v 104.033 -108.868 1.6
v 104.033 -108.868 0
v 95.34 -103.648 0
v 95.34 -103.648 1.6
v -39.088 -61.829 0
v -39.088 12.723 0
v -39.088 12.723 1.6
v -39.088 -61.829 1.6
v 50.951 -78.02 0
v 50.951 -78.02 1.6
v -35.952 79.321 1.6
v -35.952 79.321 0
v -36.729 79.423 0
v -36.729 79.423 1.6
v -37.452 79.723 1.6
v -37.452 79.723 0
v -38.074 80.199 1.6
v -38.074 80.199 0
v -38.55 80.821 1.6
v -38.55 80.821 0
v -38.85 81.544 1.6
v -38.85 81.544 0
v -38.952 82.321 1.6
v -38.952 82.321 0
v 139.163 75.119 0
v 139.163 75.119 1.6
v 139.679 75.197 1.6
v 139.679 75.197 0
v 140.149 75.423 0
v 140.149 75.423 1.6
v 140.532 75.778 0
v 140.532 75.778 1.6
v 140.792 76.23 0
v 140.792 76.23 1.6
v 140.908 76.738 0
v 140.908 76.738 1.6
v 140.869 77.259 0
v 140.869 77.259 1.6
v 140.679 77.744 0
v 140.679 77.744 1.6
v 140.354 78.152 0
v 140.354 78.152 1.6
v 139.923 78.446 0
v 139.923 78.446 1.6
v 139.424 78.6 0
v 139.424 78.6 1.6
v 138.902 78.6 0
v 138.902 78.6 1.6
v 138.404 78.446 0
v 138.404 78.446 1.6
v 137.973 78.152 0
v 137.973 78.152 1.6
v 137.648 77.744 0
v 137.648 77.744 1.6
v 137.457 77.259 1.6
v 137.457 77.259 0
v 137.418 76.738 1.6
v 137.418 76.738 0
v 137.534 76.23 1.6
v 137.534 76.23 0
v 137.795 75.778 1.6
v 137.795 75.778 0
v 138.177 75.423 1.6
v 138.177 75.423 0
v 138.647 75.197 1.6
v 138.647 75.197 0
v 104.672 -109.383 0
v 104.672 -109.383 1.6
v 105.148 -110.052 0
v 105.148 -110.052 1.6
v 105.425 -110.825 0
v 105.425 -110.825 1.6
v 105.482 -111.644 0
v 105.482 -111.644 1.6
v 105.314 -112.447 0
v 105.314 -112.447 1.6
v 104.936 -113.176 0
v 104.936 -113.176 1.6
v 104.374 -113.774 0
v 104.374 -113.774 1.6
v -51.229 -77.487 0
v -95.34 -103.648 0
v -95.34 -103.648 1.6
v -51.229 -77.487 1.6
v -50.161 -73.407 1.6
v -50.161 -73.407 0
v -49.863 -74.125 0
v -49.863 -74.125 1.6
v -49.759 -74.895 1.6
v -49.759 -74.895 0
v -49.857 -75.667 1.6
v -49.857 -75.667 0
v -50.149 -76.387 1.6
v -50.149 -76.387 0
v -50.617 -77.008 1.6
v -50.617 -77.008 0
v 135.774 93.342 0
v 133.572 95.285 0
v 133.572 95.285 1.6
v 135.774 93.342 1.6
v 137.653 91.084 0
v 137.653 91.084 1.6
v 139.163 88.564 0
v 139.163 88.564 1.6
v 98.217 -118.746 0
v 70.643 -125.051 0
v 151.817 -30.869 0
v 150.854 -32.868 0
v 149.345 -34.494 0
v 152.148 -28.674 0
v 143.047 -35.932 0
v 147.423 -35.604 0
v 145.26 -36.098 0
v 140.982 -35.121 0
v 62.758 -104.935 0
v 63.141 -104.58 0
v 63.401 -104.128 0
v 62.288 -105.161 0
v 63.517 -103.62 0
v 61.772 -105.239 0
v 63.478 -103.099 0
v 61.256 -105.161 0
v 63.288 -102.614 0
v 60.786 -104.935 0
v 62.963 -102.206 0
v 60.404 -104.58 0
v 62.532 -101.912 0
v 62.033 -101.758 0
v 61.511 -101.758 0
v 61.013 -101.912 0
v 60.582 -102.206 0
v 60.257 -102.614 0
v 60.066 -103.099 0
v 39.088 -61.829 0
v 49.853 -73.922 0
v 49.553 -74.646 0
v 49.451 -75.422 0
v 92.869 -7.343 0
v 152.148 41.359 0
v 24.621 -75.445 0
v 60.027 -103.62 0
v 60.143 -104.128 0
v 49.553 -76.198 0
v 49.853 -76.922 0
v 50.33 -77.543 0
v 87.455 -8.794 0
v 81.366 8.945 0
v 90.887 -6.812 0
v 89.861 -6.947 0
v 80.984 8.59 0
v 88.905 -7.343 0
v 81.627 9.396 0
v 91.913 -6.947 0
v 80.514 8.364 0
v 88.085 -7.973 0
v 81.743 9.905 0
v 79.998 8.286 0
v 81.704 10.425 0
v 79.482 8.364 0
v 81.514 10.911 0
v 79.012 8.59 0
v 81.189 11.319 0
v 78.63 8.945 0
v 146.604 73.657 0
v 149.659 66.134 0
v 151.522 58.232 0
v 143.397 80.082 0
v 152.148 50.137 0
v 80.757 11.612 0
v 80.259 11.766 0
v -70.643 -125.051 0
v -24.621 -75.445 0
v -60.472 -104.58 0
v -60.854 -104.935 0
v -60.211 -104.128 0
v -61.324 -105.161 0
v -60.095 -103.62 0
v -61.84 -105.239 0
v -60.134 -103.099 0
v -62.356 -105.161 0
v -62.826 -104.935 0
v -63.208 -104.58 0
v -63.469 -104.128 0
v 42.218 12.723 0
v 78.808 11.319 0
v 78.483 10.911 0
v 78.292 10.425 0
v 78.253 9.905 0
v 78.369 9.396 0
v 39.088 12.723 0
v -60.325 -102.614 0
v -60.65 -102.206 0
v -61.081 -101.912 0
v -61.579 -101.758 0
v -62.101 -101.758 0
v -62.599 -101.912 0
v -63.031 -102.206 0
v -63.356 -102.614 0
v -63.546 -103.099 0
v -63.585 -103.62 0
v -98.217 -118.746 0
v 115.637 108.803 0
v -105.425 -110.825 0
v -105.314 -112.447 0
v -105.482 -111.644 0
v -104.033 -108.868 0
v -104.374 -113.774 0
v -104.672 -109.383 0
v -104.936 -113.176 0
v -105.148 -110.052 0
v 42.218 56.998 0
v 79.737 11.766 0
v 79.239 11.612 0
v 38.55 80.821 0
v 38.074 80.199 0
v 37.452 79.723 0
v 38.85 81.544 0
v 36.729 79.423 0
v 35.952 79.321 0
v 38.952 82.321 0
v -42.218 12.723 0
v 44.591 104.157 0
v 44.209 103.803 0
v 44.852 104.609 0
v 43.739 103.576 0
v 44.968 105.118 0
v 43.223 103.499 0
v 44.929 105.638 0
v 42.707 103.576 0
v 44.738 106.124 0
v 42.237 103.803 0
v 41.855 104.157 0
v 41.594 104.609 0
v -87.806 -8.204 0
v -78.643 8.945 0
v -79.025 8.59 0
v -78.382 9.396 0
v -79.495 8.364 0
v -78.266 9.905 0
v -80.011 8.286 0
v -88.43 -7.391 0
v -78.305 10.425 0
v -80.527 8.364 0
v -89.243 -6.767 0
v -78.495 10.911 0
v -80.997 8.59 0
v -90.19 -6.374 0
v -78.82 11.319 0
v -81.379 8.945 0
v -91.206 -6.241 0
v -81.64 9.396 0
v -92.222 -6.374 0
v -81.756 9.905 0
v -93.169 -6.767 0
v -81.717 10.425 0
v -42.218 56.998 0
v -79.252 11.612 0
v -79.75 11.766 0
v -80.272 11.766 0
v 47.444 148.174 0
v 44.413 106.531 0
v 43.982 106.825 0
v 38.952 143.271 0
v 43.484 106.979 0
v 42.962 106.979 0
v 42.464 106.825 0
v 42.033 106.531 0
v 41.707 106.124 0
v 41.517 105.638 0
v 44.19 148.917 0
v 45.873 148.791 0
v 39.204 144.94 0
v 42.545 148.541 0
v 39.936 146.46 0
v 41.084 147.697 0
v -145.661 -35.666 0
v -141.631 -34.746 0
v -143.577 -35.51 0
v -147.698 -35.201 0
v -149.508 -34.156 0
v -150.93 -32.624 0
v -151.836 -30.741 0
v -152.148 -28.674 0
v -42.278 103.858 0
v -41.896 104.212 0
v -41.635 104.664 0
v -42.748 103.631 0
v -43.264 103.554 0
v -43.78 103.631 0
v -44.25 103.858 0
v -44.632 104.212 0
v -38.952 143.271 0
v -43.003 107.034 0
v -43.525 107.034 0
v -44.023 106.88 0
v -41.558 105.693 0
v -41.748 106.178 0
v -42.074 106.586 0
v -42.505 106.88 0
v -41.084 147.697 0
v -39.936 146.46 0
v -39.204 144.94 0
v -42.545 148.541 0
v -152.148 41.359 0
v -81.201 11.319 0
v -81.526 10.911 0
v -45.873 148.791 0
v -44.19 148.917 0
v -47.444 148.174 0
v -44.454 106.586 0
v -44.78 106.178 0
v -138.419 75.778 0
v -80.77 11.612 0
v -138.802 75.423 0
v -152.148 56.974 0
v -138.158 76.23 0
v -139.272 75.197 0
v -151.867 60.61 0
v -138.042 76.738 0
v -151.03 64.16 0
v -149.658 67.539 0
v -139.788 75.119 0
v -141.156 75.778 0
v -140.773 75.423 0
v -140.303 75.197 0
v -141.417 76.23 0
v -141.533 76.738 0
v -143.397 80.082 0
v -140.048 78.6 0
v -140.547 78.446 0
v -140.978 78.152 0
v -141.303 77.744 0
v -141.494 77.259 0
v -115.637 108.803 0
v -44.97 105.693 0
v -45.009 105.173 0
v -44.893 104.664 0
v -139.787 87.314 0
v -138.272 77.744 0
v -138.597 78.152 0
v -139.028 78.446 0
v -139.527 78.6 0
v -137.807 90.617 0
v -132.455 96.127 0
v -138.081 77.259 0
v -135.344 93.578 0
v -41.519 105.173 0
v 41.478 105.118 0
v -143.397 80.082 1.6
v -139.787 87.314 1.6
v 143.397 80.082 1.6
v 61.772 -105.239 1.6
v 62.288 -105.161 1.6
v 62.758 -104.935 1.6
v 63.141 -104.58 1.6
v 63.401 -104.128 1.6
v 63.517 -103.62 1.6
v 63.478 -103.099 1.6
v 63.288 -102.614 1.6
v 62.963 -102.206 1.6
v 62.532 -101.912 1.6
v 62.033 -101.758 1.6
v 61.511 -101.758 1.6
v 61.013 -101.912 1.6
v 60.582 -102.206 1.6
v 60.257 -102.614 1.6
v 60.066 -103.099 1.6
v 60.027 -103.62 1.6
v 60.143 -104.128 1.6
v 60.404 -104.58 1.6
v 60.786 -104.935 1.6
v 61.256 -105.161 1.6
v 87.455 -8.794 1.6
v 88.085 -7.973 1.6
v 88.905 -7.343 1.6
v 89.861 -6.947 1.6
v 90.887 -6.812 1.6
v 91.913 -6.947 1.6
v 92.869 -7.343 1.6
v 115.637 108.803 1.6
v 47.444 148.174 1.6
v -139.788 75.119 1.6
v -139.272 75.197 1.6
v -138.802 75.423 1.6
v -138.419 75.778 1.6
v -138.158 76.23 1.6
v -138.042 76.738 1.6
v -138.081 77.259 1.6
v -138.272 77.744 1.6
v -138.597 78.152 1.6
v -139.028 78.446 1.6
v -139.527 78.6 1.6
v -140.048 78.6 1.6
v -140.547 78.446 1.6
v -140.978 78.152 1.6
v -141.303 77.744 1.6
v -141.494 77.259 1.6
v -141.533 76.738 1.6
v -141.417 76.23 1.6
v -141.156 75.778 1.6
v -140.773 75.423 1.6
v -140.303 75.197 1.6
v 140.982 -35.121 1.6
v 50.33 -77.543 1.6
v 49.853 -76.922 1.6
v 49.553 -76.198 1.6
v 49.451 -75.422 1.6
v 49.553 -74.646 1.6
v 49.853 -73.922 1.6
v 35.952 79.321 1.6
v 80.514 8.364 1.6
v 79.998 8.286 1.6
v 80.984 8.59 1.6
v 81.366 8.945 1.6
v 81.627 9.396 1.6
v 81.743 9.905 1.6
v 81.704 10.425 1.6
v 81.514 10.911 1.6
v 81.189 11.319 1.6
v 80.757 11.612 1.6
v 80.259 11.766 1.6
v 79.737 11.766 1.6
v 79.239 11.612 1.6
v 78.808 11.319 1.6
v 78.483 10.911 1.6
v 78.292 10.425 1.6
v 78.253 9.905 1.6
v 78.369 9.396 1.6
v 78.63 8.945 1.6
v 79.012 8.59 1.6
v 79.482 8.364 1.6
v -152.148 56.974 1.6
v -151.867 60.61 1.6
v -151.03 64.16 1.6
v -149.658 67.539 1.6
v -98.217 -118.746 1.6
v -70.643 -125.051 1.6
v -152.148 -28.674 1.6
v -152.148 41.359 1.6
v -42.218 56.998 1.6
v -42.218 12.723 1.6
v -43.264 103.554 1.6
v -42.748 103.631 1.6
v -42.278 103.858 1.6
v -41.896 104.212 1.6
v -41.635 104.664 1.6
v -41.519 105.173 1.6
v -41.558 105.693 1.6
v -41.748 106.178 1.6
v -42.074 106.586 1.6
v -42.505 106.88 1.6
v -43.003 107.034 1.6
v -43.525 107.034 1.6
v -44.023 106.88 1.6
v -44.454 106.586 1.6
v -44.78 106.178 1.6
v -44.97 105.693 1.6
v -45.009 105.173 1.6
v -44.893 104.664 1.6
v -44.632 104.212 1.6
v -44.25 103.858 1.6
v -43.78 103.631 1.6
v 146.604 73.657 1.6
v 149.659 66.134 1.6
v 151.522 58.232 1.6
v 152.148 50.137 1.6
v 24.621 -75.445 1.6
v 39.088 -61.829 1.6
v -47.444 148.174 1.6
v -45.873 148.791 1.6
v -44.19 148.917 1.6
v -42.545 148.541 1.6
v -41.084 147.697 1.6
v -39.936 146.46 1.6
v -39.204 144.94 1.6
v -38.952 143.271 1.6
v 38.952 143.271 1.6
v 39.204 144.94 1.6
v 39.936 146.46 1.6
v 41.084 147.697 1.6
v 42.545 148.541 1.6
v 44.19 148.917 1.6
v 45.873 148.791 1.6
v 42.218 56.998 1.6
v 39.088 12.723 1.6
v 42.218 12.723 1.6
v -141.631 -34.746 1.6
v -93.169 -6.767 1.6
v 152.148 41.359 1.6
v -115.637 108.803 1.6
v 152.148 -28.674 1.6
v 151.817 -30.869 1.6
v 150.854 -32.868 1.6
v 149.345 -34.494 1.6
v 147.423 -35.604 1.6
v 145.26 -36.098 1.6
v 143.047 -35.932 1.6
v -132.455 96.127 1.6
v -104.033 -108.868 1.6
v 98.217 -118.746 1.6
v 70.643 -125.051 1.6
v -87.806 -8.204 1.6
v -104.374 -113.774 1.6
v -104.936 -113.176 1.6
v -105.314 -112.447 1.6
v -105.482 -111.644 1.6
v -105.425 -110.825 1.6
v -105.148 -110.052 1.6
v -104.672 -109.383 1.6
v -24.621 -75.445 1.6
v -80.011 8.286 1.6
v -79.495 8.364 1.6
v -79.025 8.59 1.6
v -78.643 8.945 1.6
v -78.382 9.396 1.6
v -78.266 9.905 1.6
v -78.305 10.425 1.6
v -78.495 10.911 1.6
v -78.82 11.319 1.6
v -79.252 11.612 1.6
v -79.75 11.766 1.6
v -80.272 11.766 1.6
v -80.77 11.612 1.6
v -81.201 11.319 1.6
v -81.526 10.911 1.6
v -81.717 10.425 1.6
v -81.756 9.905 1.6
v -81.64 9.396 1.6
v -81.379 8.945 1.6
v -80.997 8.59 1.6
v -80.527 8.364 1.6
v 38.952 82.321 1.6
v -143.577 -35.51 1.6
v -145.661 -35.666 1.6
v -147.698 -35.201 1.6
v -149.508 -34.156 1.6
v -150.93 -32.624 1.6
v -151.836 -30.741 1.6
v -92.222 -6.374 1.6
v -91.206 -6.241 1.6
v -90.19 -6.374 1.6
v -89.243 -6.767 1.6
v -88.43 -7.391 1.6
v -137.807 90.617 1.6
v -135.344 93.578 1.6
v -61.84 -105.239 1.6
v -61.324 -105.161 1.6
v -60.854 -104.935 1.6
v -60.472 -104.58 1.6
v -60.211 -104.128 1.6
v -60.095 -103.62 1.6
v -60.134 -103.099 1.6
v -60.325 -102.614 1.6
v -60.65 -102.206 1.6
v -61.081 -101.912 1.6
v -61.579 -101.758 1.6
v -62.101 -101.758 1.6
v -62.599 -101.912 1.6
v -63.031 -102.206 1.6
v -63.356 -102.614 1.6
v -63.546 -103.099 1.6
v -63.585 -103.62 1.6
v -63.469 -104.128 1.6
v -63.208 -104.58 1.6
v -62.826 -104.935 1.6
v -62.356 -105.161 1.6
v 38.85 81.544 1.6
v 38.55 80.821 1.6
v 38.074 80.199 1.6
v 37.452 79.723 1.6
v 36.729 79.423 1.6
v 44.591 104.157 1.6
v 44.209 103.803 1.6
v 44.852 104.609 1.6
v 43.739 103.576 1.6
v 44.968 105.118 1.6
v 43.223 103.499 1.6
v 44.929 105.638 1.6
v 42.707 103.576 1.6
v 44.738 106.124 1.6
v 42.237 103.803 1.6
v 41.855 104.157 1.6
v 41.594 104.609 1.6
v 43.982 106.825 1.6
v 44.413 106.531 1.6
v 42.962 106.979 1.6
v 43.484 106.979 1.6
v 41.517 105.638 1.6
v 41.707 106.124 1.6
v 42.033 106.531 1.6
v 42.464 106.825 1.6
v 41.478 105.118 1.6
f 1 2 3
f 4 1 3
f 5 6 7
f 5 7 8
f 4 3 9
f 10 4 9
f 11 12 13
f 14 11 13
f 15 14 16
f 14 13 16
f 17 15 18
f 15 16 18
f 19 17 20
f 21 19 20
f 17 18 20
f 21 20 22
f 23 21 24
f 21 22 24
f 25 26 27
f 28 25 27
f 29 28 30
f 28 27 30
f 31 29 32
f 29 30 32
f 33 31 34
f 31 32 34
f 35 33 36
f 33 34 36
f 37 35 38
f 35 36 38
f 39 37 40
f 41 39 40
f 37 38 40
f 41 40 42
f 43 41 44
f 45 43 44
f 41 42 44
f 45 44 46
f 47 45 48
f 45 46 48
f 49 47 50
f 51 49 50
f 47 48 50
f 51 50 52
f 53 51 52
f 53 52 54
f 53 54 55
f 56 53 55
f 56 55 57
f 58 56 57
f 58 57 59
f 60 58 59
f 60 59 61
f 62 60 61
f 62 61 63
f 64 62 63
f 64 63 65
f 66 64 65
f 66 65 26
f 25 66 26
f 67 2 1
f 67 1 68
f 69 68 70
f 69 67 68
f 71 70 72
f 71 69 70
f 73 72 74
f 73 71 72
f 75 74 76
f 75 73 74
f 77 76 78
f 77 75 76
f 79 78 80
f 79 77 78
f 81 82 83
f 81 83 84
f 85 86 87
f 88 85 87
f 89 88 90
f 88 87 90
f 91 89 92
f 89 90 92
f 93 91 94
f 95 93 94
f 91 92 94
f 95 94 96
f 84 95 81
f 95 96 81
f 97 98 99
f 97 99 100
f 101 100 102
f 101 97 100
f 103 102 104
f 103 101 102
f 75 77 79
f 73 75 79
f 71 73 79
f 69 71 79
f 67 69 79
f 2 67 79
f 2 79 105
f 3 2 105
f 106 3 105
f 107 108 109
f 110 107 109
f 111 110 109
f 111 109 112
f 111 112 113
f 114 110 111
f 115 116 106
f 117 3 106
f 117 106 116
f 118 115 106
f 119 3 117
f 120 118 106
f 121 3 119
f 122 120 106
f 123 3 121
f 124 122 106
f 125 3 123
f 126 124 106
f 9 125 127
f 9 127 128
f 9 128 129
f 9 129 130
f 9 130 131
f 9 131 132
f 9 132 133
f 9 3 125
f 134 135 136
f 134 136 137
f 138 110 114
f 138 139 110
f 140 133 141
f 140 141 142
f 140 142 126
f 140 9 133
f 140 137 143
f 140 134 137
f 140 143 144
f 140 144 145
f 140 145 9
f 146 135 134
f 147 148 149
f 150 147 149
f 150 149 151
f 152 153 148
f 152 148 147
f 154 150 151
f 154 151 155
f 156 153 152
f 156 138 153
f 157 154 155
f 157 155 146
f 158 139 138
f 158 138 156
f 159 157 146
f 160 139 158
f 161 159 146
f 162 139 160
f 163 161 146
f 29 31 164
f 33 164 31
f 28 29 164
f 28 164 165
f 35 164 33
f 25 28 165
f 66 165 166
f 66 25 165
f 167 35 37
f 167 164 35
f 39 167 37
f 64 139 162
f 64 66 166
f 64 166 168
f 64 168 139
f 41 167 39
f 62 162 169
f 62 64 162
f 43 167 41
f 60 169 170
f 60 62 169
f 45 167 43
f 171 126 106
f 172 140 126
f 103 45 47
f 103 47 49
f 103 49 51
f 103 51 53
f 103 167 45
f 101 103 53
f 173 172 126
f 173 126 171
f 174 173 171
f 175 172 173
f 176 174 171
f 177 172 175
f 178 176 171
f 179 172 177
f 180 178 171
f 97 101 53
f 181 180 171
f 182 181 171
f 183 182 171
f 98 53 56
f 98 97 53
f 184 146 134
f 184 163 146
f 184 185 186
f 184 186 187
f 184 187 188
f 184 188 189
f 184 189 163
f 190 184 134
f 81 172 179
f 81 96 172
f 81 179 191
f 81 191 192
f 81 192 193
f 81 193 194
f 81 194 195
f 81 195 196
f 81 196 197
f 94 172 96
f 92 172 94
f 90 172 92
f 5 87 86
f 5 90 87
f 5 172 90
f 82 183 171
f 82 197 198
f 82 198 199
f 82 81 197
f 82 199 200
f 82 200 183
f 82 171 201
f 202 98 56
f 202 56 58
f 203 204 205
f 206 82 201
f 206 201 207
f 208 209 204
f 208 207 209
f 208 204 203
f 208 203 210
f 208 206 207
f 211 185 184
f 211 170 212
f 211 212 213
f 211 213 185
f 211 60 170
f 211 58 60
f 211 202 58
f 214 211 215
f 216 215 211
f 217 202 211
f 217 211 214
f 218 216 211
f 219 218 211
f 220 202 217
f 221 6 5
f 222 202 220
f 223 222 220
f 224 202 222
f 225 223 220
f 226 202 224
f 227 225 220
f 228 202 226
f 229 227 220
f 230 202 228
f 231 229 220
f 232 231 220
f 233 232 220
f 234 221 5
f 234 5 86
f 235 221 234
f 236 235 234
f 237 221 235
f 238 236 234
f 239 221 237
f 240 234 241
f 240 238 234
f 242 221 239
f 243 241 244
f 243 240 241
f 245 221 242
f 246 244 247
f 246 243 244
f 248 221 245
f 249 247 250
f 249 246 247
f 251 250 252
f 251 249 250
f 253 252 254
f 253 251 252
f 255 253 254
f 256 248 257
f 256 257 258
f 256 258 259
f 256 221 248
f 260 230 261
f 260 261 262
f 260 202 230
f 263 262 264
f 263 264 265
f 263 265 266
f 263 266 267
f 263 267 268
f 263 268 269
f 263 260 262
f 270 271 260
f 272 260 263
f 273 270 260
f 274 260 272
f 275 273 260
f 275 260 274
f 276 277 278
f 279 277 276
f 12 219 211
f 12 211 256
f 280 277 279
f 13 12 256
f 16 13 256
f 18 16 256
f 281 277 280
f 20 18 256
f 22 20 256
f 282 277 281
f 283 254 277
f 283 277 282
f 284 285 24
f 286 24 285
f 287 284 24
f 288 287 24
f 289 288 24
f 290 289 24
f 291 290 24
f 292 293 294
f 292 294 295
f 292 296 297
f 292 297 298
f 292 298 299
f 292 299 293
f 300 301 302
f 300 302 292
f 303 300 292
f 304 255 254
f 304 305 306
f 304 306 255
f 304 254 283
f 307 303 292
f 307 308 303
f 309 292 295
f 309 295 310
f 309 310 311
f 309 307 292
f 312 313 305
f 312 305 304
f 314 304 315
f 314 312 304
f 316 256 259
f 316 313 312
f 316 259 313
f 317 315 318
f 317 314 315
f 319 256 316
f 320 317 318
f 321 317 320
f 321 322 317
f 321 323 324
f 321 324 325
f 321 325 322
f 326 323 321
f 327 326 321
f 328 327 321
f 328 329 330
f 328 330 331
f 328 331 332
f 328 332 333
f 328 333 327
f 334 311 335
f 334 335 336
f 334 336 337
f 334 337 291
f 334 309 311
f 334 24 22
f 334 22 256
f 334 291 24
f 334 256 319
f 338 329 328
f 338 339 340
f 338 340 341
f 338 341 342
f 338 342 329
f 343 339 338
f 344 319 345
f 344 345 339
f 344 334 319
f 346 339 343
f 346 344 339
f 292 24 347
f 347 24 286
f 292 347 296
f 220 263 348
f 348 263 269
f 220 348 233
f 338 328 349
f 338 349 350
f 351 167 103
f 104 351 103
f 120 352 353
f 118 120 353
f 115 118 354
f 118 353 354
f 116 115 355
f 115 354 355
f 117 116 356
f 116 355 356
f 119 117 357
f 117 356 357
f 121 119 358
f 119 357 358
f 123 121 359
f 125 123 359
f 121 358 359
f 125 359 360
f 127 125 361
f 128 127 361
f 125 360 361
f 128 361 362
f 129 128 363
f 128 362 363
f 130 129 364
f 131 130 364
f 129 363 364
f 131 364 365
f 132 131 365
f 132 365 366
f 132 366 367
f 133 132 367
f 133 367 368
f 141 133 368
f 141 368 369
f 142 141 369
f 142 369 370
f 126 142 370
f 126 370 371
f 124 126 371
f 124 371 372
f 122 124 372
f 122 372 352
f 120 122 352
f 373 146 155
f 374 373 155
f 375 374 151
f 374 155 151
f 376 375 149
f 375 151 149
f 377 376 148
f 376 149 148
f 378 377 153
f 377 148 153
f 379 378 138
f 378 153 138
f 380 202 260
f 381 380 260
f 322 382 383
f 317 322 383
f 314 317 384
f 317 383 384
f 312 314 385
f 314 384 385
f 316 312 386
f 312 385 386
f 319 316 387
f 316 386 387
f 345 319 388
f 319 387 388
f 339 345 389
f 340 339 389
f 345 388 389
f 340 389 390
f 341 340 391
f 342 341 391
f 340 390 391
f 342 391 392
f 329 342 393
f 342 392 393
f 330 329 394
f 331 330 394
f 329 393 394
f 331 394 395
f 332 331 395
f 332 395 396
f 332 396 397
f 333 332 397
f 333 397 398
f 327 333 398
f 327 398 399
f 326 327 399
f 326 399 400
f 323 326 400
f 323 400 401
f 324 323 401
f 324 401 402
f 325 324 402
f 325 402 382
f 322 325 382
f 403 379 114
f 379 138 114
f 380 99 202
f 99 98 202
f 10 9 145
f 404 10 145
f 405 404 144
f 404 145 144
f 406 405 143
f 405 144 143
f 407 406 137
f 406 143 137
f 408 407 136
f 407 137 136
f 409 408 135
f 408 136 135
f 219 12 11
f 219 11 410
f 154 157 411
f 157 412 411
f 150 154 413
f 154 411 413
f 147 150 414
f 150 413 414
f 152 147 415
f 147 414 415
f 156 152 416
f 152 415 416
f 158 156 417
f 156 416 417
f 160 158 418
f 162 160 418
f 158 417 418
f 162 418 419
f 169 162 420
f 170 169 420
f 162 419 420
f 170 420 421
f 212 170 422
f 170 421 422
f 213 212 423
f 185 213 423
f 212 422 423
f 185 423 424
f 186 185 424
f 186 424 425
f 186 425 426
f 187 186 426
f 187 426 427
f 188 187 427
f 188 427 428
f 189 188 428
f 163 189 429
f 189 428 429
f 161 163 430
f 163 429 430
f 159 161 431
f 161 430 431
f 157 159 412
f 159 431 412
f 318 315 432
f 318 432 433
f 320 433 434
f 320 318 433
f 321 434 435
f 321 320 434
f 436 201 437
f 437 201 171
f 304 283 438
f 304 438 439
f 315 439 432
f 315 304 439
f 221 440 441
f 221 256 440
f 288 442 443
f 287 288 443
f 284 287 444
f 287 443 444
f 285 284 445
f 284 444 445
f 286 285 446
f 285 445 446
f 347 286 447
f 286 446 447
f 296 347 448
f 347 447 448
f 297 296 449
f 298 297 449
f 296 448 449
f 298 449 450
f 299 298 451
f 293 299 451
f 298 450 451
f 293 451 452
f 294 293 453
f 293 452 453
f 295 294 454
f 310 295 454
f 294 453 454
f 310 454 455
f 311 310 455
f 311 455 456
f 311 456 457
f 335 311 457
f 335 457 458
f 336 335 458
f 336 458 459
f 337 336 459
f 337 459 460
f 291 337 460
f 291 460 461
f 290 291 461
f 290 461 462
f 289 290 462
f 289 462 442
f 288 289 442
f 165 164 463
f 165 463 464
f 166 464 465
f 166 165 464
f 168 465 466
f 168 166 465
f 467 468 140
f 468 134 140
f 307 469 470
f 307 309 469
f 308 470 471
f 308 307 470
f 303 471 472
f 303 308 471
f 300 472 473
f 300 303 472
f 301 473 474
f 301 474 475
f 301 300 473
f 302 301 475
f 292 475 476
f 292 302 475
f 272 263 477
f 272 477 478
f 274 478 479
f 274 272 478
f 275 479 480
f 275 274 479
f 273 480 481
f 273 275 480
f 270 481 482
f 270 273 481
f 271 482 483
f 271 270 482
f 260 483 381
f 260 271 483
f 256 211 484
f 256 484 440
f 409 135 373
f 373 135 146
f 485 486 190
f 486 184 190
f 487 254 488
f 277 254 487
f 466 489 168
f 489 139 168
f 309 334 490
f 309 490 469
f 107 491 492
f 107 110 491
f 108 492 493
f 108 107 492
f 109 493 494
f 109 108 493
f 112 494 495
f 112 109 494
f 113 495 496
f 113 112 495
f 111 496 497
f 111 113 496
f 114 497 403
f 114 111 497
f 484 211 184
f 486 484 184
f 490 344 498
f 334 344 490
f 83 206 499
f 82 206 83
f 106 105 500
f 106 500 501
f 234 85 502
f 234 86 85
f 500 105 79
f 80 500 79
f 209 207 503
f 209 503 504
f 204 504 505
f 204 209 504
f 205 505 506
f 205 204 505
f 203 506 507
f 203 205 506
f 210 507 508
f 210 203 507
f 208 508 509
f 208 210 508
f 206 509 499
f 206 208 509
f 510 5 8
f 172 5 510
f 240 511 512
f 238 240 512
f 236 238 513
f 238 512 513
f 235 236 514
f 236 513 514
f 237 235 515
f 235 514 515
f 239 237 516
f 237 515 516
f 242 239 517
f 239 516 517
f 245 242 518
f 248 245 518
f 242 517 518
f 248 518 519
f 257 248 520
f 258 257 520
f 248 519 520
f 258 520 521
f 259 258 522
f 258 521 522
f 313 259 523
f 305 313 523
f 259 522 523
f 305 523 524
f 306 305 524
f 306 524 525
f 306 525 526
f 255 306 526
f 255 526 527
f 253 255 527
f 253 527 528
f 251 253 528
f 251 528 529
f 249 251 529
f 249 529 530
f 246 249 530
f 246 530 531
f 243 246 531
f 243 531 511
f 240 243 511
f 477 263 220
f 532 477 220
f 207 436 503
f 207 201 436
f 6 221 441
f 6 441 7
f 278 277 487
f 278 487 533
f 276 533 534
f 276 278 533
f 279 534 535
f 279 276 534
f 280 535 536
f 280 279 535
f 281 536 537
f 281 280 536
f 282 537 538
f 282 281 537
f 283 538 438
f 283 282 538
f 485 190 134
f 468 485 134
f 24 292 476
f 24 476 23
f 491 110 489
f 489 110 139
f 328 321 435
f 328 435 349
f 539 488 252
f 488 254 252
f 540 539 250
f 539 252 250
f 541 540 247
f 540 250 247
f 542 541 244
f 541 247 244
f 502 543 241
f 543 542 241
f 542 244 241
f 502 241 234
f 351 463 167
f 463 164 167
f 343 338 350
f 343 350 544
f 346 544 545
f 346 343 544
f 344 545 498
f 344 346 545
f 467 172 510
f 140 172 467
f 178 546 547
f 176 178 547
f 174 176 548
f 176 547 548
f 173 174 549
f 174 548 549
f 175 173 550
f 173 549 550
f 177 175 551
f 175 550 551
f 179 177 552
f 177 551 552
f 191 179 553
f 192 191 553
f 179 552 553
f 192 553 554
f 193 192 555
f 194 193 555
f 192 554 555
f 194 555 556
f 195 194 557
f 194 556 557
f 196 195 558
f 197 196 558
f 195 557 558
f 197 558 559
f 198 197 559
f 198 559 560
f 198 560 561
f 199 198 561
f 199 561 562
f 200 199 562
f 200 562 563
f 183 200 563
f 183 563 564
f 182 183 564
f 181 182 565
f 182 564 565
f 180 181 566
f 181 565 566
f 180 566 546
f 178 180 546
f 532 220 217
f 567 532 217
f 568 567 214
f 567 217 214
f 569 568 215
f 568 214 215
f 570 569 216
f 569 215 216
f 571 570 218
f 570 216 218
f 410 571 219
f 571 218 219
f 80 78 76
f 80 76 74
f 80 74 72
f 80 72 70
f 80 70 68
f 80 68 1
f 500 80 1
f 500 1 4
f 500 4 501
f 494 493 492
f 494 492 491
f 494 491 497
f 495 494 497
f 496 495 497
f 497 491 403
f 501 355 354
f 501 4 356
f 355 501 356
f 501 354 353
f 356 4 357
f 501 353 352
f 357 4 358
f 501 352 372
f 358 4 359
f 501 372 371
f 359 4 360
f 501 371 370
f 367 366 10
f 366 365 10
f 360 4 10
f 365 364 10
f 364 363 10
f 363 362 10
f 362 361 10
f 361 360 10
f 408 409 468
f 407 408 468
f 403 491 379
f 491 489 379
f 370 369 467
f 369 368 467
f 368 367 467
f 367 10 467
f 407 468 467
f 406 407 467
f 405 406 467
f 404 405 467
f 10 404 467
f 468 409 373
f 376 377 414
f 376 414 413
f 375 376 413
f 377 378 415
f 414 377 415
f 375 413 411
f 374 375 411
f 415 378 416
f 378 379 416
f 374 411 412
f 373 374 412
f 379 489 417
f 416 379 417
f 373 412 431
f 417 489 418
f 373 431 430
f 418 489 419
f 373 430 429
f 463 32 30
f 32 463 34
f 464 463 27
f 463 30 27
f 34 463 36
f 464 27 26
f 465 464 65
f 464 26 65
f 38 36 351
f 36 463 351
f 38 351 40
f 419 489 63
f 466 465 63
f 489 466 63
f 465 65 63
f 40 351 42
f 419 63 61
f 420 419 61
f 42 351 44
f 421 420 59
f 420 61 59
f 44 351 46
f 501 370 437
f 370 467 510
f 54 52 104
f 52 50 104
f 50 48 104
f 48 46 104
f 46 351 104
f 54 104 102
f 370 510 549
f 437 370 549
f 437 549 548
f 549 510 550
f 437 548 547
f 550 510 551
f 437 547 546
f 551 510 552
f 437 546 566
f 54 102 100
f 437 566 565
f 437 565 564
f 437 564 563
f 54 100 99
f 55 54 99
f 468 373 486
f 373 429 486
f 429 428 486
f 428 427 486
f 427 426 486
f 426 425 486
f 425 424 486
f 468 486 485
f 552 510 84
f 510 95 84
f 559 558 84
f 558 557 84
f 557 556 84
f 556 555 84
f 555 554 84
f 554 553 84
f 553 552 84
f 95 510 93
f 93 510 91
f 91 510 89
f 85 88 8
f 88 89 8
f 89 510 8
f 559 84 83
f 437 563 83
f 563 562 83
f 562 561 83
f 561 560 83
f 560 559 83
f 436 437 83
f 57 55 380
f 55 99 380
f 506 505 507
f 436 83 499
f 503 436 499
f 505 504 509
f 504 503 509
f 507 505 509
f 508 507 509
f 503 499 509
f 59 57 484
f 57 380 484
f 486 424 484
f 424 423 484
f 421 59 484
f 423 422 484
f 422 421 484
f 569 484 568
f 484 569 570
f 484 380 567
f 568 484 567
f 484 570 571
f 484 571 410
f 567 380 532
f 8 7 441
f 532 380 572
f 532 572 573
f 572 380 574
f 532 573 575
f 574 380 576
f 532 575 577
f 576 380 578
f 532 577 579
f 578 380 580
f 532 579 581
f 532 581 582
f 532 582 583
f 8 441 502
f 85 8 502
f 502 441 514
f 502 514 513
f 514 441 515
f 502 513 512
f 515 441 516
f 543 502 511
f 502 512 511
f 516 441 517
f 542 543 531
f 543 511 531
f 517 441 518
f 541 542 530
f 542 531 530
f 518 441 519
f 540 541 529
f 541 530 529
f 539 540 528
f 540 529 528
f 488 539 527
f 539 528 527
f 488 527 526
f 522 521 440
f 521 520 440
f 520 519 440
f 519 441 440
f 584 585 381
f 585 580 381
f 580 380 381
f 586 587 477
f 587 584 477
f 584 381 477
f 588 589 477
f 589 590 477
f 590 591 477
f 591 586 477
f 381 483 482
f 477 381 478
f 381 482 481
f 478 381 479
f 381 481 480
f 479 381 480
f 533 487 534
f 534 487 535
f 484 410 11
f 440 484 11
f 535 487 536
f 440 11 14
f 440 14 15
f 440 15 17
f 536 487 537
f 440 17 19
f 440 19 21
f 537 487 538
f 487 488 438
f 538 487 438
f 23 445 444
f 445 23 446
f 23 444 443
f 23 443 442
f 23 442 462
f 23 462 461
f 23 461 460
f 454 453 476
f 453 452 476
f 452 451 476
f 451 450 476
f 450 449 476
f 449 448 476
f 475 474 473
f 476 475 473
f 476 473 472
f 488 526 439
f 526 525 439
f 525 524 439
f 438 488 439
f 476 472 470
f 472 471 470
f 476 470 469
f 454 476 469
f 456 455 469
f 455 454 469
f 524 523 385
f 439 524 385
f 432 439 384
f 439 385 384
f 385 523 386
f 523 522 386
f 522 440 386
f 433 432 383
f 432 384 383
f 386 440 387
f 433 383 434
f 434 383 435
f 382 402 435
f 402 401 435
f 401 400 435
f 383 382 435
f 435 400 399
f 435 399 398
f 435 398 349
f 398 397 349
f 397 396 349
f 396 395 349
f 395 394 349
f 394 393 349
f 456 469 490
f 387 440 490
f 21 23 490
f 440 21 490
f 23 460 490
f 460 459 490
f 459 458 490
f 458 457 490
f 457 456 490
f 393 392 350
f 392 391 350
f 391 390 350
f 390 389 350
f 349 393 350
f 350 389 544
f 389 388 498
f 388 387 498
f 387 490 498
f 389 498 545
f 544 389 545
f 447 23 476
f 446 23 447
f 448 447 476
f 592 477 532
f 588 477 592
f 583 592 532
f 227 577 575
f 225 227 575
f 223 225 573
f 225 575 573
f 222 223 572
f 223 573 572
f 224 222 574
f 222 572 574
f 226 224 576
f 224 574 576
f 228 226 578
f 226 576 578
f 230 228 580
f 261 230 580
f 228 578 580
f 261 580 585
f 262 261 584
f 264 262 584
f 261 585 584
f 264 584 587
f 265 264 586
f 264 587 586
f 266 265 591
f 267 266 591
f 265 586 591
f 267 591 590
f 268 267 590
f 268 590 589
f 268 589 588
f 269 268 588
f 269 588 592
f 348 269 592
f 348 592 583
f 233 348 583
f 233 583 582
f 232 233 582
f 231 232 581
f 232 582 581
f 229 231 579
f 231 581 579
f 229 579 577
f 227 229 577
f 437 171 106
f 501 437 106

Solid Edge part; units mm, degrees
sketch "Sketch1" plane through (0, 0, 0) normal (0, 0, -1) x (-1, 0, 0)
  line L0 (95.3397, -103.6479) -> (51.2285, -77.4874)
  arc A0 (50.1607, -73.407) -> (51.2285, -77.4874) centre (52.7588, -74.907) ccw
  line L1 (50.1607, -73.407) -> (87.8058, -8.2038)
  arc A1 (87.8058, -8.2038) -> (93.1692, -6.7667) centre (91.2061, -10.1669) cw
  line L2 (93.1692, -6.7667) -> (141.6312, -34.7462)
  arc A2 (152.148, -28.6744) -> (141.6312, -34.7462) centre (145.1368, -28.6744) cw
  line L3 (152.148, -28.6744) -> (152.148, 41.3592)
  line L4 (152.148, 41.3592) -> (152.148, 56.9741)
  arc A3 (152.148, 56.9741) -> (149.6578, 67.5392) centre (128.4914, 56.9741) ccw
  line L5 (149.6578, 67.5392) -> (143.3974, 80.0815)
  line L6 (143.3974, 80.0815) -> (139.7875, 87.3136)
  arc A4 (132.4553, 96.1265) -> (139.7875, 87.3136) centre (117.3845, 76.1313) cw
  line L7 (132.4553, 96.1265) -> (115.6366, 108.8032)
  line L8 (115.6366, 108.8032) -> (47.4442, 148.174)
  arc A5 (47.4442, 148.174) -> (38.9522, 143.2712) centre (44.6135, 143.2712) ccw
  line L9 (38.9522, 143.2712) -> (38.9522, 82.3207)
  arc A6 (35.9522, 79.3207) -> (38.9522, 82.3207) centre (35.9522, 82.3207) ccw
  line L10 (35.9522, 79.3207) -> (0, 79.3207)
  line L11 (-35.9522, 79.3207) -> (0, 79.3207)
  arc A7 (-38.9522, 82.3207) -> (-35.9522, 79.3207) centre (-35.9522, 82.3207) ccw
  line L12 (-38.9522, 143.2712) -> (-38.9522, 82.3207)
  arc A8 (-47.4442, 148.174) -> (-38.9522, 143.2712) centre (-44.6135, 143.2712) cw
  line L13 (-115.6366, 108.8032) -> (-47.4442, 148.174)
  line L14 (-133.5716, 95.2852) -> (-115.6366, 108.8032)
  arc A9 (-139.1633, 88.5642) -> (-133.5716, 95.2852) centre (-122.0781, 80.0363) cw
  line L15 (-143.3974, 80.0815) -> (-139.1633, 88.5642)
  line L16 (-146.6042, 73.6569) -> (-143.3974, 80.0815)
  arc A10 (-152.148, 50.1368) -> (-146.6042, 73.6569) centre (-99.4833, 50.1368) cw
  line L17 (-152.148, 41.3592) -> (-152.148, 50.1368)
  line L18 (-152.148, -28.6744) -> (-152.148, 41.3592)
  arc A11 (-152.148, -28.6744) -> (-140.9818, -35.1212) centre (-144.7038, -28.6744) ccw
  line L19 (-92.869, -7.3433) -> (-140.9818, -35.1212)
  arc A12 (-92.869, -7.3433) -> (-87.4547, -8.794) centre (-90.8872, -10.7758) cw
  line L20 (-49.853, -73.922) -> (-87.4547, -8.794)
  arc A13 (-49.853, -73.922) -> (-50.9511, -78.0201) centre (-52.4511, -75.422) cw
  line L21 (-95.3397, -103.6479) -> (-50.9511, -78.0201)
  line L22 (-104.033, -108.8682) -> (-95.3397, -103.6479)
  arc A14 (-104.3735, -113.774) -> (-104.033, -108.8682) centre (-102.4886, -111.4401) cw
  line L23 (-98.2167, -118.7465) -> (-104.3735, -113.774)
  line L24 (-98.2167, -118.7465) -> (-70.6434, -125.0511)
  line L25 (-70.6434, -125.0511) -> (0, -125.0511)
  line L26 (70.6434, -125.0511) -> (0, -125.0511)
  line L27 (98.2167, -118.7465) -> (70.6434, -125.0511)
  line L28 (98.2167, -118.7465) -> (104.3735, -113.774)
  arc A15 (104.033, -108.8682) -> (104.3735, -113.774) centre (102.4886, -111.4401) cw
  line L29 (104.033, -108.8682) -> (95.3397, -103.6479)
  line L30 (39.0877, 12.7232) -> (39.0877, -61.8289)
  line L31 (39.0877, -61.8289) -> (24.621, -75.4447)
  line L32 (24.621, -75.4447) -> (0, -75.4447)
  line L33 (-24.621, -75.4447) -> (0, -75.4447)
  line L34 (-39.0877, -61.8289) -> (-24.621, -75.4447)
  line L35 (-39.0877, 12.7232) -> (-39.0877, -61.8289)
  line L36 (-42.2177, 12.7232) -> (-39.0877, 12.7232)
  line L37 (-42.2177, 56.9983) -> (-42.2177, 12.7232)
  line L38 (0, 56.9983) -> (-42.2177, 56.9983)
  line L39 (0, 56.9983) -> (42.2177, 56.9983)
  line L40 (42.2177, 56.9983) -> (42.2177, 12.7232)
  line L41 (42.2177, 12.7232) -> (39.0877, 12.7232)
extrude "Protrusion1" add sketch "Sketch1" against normal blind 1.6
hole "Hole_1" at (-61.8402, -103.4888, 1.6) direction (0, 0, -1) diameter 3.5 end up to next
hole "Hole1" at (61.7723, -103.4888, 1.6) direction (0, 0, -1) diameter 3.5 end up to next
hole "Hole2" at (-80.0108, 10.0358, 1.6) direction (0, 0, -1) diameter 3.5 end up to next
hole "Hole3" at (79.9982, 10.0358, 1.6) direction (0, 0, -1) diameter 3.5 end up to next
hole "Hole4" at (43.2229, 105.2486, 1.6) direction (0, 0, -1) diameter 3.5 end up to next
hole "Hole5" at (-43.264, 105.3035, 1.6) direction (0, 0, -1) diameter 3.5 end up to next
hole "Hole6" at (139.1633, 76.8692, 1.6) direction (0, 0, -1) diameter 3.5 end up to next
hole "Hole7" at (-139.7875, 76.8692, 1.6) direction (0, 0, -1) diameter 3.5 end up to next
